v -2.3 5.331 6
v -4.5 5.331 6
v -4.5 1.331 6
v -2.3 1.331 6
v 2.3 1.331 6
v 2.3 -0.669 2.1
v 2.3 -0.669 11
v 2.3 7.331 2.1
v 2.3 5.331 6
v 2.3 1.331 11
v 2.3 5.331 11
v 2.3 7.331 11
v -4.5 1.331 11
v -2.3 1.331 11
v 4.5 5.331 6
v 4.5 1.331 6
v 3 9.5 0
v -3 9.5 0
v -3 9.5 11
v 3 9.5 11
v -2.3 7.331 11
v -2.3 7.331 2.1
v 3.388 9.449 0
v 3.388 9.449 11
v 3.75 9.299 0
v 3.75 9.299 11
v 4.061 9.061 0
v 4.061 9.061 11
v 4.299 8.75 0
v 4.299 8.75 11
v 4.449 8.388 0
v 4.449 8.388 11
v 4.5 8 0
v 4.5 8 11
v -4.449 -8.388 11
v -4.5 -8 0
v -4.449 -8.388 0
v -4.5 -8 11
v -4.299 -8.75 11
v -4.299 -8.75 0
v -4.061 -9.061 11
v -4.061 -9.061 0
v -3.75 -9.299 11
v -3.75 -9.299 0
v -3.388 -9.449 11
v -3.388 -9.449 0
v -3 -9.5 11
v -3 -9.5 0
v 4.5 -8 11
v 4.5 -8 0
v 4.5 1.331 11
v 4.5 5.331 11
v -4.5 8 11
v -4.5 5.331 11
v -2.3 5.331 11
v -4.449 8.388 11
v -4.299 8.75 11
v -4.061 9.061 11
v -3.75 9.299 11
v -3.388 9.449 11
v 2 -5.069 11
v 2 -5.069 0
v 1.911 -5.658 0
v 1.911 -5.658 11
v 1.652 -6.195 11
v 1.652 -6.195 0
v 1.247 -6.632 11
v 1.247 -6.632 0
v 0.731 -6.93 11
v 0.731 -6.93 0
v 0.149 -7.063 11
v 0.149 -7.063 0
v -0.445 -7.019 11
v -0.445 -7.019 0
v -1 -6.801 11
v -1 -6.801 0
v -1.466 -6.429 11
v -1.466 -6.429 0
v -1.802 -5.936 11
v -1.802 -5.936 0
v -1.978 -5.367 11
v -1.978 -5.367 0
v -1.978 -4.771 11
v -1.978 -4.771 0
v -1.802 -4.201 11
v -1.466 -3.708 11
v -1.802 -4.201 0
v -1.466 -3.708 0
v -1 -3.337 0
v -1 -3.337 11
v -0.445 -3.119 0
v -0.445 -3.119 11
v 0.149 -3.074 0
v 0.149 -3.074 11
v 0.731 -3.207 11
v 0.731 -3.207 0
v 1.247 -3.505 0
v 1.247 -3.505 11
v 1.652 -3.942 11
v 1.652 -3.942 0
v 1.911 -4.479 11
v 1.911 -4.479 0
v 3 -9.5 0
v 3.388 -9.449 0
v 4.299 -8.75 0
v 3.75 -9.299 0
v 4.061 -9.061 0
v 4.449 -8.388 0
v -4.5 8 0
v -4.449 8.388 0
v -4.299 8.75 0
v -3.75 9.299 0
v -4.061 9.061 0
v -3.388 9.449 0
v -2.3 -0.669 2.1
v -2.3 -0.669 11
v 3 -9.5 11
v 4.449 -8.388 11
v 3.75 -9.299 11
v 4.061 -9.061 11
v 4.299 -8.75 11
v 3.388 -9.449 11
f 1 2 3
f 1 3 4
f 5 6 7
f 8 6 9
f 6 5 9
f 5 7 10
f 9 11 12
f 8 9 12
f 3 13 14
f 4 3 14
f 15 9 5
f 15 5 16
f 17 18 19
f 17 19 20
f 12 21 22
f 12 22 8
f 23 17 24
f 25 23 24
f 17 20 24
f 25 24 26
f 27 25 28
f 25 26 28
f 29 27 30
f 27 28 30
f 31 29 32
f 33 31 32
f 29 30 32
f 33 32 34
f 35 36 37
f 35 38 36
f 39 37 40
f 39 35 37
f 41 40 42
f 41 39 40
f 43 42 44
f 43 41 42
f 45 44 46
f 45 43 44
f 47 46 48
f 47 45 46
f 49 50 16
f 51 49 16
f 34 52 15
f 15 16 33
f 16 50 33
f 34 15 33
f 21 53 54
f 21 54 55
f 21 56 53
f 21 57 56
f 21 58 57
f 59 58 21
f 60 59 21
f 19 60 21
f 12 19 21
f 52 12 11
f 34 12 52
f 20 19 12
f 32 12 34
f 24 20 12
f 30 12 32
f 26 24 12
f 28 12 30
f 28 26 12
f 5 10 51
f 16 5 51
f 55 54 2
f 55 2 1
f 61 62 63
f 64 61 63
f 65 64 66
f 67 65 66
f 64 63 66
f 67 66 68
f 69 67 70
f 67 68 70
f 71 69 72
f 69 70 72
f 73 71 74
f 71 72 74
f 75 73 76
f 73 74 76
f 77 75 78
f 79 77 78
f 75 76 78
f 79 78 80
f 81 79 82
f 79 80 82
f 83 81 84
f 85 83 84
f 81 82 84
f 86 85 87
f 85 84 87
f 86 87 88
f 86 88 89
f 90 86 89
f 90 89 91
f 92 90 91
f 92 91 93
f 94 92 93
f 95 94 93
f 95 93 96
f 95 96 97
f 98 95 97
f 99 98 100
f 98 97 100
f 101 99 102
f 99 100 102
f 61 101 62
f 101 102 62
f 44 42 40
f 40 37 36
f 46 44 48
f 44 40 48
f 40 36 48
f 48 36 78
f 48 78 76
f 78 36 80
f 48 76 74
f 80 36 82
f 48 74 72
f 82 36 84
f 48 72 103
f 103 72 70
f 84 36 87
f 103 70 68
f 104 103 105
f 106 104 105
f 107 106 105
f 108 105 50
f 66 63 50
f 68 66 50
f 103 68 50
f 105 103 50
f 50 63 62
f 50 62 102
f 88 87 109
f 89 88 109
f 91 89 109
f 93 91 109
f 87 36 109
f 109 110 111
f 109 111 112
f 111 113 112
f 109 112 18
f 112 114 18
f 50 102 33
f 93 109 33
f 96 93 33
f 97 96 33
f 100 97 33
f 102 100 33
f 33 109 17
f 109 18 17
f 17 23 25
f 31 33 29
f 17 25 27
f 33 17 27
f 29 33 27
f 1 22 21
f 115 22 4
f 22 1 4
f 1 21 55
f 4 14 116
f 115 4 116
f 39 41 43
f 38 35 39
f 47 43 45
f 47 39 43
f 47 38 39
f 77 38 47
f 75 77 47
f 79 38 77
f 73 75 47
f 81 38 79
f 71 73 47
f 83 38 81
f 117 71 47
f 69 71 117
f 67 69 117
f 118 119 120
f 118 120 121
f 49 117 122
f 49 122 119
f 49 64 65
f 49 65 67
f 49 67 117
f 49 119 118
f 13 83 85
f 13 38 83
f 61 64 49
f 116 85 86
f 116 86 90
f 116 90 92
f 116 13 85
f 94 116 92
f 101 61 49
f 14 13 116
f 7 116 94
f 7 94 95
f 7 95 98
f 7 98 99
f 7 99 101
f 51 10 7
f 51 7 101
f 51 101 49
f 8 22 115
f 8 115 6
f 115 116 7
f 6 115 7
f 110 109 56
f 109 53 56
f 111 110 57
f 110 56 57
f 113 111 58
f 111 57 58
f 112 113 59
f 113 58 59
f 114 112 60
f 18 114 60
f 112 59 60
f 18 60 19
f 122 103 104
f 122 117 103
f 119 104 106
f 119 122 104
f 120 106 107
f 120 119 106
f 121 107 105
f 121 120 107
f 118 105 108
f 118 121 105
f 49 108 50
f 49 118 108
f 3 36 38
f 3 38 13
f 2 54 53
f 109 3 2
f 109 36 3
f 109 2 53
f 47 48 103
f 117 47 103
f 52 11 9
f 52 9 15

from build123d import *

# Parameters (mm, degrees)
F0_W     = 9
F0_H     = 19
F1_DEPTH = 11
F3_R     = 2
F4_DEPTH = 11
F6_W     = 4.6
F6_H     = 3.6
F6_H_2   = 2.2
F7_DEPTH = 8.9
F8_W     = 9.0002920479
F8_H     = 4
F9_DEPTH = 5
F10_R    = 1.5


with BuildPart() as f1:
    # F0 (on Top) → F1 (new body)
    with BuildSketch(Plane.XY):
        Rectangle(F0_W, F0_H)
    extrude(amount=F1_DEPTH)

    # F3 (on offset) → F4 (cut)
    with BuildSketch(Plane(origin=(0, 0, 0), x_dir=(1, 0, 0), z_dir=(0, 0, -1))):
        with Locations((0, 5.0686830655)):
            Circle(F3_R)
    extrude(amount=-F4_DEPTH, mode=Mode.SUBTRACT)

    # F6 (on offset) → F7 (cut)
    with BuildSketch(Plane.XY.offset(11)):
        with Locations((0, 3.3313169345)):
            Rectangle(F6_W, F6_H)
        with Locations((0, 6.2313169345)):
            Rectangle(F6_W, F6_H_2)
        with Locations((0, 0.4313169345)):
            Rectangle(F6_W, F6_H_2)
    extrude(amount=-F7_DEPTH, mode=Mode.SUBTRACT)

    # F8 (on offset) → F9 (cut)
    with BuildSketch(Plane.XY.offset(11)):
        with Locations((0, 3.3313169345)):
            Rectangle(F8_W, F8_H)
    extrude(amount=-F9_DEPTH, mode=Mode.SUBTRACT)

    # F10
    f10_edges = [f1.edges().sort_by_distance(p)[0] for p in [
        (4.5, 9.5, 5.5),
        (-4.5, 9.5, 5.5),
        (4.5, -9.5, 5.5),
        (-4.5, -9.5, 5.5),
    ]]
    fillet(f10_edges, radius=F10_R)


solid = f1.part
